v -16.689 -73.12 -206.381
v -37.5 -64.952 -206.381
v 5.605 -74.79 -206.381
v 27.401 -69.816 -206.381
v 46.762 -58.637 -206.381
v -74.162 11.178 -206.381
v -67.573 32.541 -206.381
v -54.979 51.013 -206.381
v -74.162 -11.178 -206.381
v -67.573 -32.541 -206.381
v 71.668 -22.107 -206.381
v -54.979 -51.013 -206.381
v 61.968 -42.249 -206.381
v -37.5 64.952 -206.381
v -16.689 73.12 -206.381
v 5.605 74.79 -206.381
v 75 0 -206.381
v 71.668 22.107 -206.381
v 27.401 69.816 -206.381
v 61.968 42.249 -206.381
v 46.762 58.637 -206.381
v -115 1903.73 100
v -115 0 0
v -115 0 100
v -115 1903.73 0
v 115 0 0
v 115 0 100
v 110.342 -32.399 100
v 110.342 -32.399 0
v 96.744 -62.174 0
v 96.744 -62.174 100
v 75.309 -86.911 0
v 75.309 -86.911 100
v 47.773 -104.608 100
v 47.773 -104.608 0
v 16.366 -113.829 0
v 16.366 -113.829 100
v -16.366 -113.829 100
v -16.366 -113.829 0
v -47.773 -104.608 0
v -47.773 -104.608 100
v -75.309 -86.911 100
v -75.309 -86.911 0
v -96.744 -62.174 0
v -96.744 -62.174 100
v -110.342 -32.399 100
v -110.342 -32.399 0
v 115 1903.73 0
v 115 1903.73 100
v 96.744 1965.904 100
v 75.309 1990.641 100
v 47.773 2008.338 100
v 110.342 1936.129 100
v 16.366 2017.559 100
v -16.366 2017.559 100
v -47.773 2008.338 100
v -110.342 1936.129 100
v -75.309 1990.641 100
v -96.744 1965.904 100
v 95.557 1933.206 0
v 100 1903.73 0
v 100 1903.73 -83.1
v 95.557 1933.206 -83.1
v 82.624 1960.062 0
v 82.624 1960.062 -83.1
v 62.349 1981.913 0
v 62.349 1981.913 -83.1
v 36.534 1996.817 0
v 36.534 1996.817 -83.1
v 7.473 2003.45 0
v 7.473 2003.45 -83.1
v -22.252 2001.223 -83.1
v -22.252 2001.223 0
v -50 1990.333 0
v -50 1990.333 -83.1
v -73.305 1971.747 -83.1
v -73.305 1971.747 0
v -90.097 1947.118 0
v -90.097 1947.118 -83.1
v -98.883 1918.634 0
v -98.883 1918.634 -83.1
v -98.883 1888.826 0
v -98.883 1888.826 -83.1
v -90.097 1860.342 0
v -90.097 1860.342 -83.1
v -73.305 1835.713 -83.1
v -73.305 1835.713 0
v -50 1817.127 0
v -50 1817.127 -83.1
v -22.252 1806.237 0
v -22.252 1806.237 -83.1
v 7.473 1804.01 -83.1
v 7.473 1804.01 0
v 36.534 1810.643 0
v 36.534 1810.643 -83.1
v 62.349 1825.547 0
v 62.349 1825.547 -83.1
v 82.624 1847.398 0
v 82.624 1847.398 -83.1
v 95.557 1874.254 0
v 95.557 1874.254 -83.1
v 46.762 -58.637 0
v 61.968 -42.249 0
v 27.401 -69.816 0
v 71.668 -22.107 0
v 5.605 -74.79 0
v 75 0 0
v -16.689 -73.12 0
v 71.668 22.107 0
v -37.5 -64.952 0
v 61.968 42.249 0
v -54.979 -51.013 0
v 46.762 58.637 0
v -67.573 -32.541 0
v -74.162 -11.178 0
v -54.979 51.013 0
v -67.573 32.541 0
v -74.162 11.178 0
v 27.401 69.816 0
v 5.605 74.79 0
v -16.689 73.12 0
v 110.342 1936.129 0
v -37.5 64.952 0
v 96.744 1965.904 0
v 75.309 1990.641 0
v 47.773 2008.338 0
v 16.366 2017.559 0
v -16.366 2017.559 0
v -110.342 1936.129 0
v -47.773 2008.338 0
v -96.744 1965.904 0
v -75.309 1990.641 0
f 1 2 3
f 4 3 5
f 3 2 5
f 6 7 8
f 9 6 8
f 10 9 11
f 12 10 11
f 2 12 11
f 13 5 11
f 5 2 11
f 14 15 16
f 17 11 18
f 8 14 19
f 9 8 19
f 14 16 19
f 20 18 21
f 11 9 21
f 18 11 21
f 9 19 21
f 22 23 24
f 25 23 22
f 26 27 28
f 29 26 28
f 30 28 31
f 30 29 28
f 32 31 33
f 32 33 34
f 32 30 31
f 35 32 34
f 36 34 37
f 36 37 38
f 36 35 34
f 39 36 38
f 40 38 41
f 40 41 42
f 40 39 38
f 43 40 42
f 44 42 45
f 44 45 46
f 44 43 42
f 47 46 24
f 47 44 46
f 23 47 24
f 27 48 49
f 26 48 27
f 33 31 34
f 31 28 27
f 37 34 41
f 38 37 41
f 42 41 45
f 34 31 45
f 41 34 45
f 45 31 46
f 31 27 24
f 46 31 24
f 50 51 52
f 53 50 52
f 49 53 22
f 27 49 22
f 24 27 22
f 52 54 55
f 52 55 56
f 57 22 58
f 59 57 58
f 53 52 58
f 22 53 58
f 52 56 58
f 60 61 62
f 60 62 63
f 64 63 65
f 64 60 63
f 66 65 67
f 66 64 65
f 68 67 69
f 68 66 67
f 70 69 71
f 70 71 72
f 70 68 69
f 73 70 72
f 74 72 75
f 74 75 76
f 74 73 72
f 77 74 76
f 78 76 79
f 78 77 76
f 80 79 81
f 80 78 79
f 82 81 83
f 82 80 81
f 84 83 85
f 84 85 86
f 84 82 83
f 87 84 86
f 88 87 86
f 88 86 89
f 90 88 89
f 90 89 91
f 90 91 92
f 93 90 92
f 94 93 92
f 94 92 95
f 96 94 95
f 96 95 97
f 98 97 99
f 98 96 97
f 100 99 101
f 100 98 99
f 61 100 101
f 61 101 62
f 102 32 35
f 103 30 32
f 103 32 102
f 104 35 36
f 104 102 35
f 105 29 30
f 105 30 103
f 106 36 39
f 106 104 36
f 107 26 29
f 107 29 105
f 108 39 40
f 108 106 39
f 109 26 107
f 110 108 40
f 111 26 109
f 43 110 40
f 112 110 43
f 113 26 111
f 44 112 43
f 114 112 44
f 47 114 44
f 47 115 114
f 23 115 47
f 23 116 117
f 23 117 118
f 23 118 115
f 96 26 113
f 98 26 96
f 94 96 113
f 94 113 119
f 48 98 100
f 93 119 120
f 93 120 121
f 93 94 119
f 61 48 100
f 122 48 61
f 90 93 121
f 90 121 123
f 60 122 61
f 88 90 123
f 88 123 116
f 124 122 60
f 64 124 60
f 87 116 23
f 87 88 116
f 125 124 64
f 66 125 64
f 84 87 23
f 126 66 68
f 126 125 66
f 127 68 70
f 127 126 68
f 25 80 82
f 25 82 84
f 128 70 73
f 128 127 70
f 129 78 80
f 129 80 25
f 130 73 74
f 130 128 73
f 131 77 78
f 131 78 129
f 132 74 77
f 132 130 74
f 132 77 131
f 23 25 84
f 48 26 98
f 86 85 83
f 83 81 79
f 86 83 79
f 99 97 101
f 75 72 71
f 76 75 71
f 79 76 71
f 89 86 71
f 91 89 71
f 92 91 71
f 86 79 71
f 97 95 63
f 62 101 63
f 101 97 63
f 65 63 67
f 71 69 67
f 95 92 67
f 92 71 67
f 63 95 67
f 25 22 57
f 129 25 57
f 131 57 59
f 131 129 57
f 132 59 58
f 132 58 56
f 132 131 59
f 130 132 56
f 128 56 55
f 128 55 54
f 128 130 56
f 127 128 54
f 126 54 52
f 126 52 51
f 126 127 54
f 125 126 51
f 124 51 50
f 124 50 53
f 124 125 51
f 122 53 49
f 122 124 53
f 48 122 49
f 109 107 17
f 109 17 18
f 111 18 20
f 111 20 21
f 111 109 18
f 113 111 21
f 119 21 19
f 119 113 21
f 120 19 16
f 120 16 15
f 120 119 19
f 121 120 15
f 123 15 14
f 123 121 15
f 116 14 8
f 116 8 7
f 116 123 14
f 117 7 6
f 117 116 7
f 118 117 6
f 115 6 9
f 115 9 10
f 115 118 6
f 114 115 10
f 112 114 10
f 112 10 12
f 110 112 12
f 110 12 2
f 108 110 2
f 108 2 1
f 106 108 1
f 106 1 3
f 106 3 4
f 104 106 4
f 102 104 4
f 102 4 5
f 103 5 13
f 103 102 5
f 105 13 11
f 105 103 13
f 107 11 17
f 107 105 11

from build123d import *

# Parameters (mm, degrees)
BOSS_EXTRUDE1_DEPTH = 100
SKETCH1_4_R         = 100
BOSS_EXTRUDE3_DEPTH = 83.10006502
SKETCH1_5_R         = 75
BOSS_EXTRUDE4_DEPTH = 206.380604418


with BuildPart() as part:
    # Sketch1 → Boss-Extrude1 (new body)
    with BuildSketch(Plane.XY):
        with BuildLine():
            Line((-115, 0), (-115, 1903.73))
            ThreePointArc((-115, 1903.73), (0, 2018.73), (115, 1903.73))
            Line((115, 1903.73), (115, 0))
            ThreePointArc((115, 0), (0, -115), (-115, 0))
        make_face()
    extrude(amount=BOSS_EXTRUDE1_DEPTH)

    # Sketch1<4> → Boss-Extrude3 (add)
    with BuildSketch(Plane.XY):
        with Locations((0, 1903.73)):
            Circle(SKETCH1_4_R)
    extrude(amount=-BOSS_EXTRUDE3_DEPTH)

    # Sketch1<5> → Boss-Extrude4 (add)
    with BuildSketch(Plane.XY):
        Circle(SKETCH1_5_R)
    extrude(amount=-BOSS_EXTRUDE4_DEPTH)


solid = part.part
